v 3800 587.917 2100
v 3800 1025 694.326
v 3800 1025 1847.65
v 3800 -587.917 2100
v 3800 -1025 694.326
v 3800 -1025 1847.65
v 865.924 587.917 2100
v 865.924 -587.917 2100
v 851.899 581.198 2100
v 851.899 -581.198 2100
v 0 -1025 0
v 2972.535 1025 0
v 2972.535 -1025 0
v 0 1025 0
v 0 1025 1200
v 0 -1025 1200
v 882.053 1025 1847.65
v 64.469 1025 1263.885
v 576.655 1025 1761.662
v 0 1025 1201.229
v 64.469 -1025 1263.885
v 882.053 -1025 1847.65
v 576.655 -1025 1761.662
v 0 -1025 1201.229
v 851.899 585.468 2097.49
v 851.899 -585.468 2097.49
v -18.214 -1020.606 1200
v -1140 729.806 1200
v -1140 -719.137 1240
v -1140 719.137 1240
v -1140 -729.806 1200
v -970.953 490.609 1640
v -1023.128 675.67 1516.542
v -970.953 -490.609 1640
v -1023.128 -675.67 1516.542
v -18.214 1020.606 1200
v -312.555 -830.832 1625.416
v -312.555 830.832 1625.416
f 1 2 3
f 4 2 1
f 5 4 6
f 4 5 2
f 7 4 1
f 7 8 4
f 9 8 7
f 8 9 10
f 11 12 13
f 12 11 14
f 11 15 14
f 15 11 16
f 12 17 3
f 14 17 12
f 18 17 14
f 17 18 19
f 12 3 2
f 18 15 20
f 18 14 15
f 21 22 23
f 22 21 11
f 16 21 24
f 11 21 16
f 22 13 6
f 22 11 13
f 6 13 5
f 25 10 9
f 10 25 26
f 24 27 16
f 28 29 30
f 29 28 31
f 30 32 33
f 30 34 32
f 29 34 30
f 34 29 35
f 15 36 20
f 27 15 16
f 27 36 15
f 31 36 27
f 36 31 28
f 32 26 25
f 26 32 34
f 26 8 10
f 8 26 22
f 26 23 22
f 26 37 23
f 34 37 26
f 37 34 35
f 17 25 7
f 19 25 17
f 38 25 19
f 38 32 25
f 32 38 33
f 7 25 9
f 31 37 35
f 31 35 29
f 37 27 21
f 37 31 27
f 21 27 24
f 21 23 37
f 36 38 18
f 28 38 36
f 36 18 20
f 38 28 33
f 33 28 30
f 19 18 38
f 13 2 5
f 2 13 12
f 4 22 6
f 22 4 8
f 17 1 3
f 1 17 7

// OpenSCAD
// file: parameters.scad
// UNIMOG parameters
UNIMOG_wheelbase = 2900;
UNIMOG_width = 2030;


// Box parameters
box_length = 3800;
box_height = 2100;
box_width = 2050;
box_roof_width = 1200;
box_roof_angle = 30;
box_front_length = 1100;
box_front_width = 1500;


// Cabine parameters
cabine_height = 1120;

// Box profile width
box_profile_width = 40;
profile_depth = 2;
// main file
include <./parameters.scad>

module frame_lowpoly() {
    difference() {
        union() {
            difference() {
                translate([box_length/2, 0, box_height/2])
                cube([box_length, box_width, box_height], true);
                
                translate([-box_length/2-10+sin(45)*2*(cos(30)*(box_width-box_roof_width)-box_profile_width/3*2-100), 0, cabine_height+box_height/2+100])
                cube([box_length, box_width+400, box_height], true);
            }
            
            // front panorama
            hull() {
                translate([5, 0, cabine_height+100])
                cube([10, box_width, box_profile_width], true);
                
                translate([5+sin(45)*2*(cos(30)*(box_width-box_roof_width)-box_profile_width/3*2-100), 0, cabine_height+cos(30)*(box_width-box_roof_width)-box_profile_width/3*2])
                cube([10, box_width, box_profile_width], true);
                
                translate([5+sin(45)*2*(cos(30)*(box_width-box_roof_width)-box_profile_width/3*2-100), 0, cabine_height+100])
                cube([10, box_width, box_profile_width], true);
                
                translate([5+sin(45)*2*(cos(30)*(box_width-box_roof_width)-box_profile_width/3*2-100), 0, box_height-box_profile_width/2])
                cube([10, box_width, box_profile_width], true);
                
                translate([-box_profile_width/2-box_front_length, 0, cabine_height+100])
                cube([box_profile_width, box_front_width, box_profile_width], true);
                
                translate([-box_profile_width/2-box_front_length+sin(25)*400, 0, cabine_height+500])
                cube([box_profile_width, box_front_width-200, box_profile_width], true);
            }
        }
        
        // back angle wall
        translate([box_length, 0, -350])
        rotate([0, -40, 0])
        cube([1600, box_width+400, 1600], true);
        
        // top angle walls
        translate([box_length/2, -box_width/2-box_roof_width/2, box_height+325])
        rotate([30, 0, 0])
        cube([box_length*2, box_width, 1600], true);
        
        translate([box_length/2, box_width/2+box_roof_width/2, box_height+325])
        rotate([-30, 0, 0])
        cube([box_length*2, box_width, 1600], true);
        
        
        // top angle walls front panorama
        rotate([0, -10, 0])
        union() {
            translate([box_length/2, -box_width/2-box_roof_width/2, box_height+sin(45)*(cos(30)*(box_width-box_roof_width))/2-40])
            rotate([30, 0, -10])
            cube([box_length*2, box_width, 1600], true);
            
            translate([box_length/2, box_width/2+box_roof_width/2, box_height+sin(45)*(cos(30)*(box_width-box_roof_width))/2-40])
            rotate([-30, 0, 10])
            cube([box_length*2, box_width, 1600], true);
        }
        
        
        // side angle walls front panorama
        union() {
            translate([-box_height/2, -box_width/2-box_roof_width/2+box_profile_width*2+5, box_height+250])
            rotate([-15, 15, -18.5])
            cube([box_height*2, box_width, box_height], true);
            
            translate([-box_height/2, box_width/2+box_roof_width/2-box_profile_width*2-5, box_height+250])
            rotate([15, 15, 18.5])
            cube([box_height*2, box_width, box_height], true);
        }
        
    }
}

#frame_lowpoly();
